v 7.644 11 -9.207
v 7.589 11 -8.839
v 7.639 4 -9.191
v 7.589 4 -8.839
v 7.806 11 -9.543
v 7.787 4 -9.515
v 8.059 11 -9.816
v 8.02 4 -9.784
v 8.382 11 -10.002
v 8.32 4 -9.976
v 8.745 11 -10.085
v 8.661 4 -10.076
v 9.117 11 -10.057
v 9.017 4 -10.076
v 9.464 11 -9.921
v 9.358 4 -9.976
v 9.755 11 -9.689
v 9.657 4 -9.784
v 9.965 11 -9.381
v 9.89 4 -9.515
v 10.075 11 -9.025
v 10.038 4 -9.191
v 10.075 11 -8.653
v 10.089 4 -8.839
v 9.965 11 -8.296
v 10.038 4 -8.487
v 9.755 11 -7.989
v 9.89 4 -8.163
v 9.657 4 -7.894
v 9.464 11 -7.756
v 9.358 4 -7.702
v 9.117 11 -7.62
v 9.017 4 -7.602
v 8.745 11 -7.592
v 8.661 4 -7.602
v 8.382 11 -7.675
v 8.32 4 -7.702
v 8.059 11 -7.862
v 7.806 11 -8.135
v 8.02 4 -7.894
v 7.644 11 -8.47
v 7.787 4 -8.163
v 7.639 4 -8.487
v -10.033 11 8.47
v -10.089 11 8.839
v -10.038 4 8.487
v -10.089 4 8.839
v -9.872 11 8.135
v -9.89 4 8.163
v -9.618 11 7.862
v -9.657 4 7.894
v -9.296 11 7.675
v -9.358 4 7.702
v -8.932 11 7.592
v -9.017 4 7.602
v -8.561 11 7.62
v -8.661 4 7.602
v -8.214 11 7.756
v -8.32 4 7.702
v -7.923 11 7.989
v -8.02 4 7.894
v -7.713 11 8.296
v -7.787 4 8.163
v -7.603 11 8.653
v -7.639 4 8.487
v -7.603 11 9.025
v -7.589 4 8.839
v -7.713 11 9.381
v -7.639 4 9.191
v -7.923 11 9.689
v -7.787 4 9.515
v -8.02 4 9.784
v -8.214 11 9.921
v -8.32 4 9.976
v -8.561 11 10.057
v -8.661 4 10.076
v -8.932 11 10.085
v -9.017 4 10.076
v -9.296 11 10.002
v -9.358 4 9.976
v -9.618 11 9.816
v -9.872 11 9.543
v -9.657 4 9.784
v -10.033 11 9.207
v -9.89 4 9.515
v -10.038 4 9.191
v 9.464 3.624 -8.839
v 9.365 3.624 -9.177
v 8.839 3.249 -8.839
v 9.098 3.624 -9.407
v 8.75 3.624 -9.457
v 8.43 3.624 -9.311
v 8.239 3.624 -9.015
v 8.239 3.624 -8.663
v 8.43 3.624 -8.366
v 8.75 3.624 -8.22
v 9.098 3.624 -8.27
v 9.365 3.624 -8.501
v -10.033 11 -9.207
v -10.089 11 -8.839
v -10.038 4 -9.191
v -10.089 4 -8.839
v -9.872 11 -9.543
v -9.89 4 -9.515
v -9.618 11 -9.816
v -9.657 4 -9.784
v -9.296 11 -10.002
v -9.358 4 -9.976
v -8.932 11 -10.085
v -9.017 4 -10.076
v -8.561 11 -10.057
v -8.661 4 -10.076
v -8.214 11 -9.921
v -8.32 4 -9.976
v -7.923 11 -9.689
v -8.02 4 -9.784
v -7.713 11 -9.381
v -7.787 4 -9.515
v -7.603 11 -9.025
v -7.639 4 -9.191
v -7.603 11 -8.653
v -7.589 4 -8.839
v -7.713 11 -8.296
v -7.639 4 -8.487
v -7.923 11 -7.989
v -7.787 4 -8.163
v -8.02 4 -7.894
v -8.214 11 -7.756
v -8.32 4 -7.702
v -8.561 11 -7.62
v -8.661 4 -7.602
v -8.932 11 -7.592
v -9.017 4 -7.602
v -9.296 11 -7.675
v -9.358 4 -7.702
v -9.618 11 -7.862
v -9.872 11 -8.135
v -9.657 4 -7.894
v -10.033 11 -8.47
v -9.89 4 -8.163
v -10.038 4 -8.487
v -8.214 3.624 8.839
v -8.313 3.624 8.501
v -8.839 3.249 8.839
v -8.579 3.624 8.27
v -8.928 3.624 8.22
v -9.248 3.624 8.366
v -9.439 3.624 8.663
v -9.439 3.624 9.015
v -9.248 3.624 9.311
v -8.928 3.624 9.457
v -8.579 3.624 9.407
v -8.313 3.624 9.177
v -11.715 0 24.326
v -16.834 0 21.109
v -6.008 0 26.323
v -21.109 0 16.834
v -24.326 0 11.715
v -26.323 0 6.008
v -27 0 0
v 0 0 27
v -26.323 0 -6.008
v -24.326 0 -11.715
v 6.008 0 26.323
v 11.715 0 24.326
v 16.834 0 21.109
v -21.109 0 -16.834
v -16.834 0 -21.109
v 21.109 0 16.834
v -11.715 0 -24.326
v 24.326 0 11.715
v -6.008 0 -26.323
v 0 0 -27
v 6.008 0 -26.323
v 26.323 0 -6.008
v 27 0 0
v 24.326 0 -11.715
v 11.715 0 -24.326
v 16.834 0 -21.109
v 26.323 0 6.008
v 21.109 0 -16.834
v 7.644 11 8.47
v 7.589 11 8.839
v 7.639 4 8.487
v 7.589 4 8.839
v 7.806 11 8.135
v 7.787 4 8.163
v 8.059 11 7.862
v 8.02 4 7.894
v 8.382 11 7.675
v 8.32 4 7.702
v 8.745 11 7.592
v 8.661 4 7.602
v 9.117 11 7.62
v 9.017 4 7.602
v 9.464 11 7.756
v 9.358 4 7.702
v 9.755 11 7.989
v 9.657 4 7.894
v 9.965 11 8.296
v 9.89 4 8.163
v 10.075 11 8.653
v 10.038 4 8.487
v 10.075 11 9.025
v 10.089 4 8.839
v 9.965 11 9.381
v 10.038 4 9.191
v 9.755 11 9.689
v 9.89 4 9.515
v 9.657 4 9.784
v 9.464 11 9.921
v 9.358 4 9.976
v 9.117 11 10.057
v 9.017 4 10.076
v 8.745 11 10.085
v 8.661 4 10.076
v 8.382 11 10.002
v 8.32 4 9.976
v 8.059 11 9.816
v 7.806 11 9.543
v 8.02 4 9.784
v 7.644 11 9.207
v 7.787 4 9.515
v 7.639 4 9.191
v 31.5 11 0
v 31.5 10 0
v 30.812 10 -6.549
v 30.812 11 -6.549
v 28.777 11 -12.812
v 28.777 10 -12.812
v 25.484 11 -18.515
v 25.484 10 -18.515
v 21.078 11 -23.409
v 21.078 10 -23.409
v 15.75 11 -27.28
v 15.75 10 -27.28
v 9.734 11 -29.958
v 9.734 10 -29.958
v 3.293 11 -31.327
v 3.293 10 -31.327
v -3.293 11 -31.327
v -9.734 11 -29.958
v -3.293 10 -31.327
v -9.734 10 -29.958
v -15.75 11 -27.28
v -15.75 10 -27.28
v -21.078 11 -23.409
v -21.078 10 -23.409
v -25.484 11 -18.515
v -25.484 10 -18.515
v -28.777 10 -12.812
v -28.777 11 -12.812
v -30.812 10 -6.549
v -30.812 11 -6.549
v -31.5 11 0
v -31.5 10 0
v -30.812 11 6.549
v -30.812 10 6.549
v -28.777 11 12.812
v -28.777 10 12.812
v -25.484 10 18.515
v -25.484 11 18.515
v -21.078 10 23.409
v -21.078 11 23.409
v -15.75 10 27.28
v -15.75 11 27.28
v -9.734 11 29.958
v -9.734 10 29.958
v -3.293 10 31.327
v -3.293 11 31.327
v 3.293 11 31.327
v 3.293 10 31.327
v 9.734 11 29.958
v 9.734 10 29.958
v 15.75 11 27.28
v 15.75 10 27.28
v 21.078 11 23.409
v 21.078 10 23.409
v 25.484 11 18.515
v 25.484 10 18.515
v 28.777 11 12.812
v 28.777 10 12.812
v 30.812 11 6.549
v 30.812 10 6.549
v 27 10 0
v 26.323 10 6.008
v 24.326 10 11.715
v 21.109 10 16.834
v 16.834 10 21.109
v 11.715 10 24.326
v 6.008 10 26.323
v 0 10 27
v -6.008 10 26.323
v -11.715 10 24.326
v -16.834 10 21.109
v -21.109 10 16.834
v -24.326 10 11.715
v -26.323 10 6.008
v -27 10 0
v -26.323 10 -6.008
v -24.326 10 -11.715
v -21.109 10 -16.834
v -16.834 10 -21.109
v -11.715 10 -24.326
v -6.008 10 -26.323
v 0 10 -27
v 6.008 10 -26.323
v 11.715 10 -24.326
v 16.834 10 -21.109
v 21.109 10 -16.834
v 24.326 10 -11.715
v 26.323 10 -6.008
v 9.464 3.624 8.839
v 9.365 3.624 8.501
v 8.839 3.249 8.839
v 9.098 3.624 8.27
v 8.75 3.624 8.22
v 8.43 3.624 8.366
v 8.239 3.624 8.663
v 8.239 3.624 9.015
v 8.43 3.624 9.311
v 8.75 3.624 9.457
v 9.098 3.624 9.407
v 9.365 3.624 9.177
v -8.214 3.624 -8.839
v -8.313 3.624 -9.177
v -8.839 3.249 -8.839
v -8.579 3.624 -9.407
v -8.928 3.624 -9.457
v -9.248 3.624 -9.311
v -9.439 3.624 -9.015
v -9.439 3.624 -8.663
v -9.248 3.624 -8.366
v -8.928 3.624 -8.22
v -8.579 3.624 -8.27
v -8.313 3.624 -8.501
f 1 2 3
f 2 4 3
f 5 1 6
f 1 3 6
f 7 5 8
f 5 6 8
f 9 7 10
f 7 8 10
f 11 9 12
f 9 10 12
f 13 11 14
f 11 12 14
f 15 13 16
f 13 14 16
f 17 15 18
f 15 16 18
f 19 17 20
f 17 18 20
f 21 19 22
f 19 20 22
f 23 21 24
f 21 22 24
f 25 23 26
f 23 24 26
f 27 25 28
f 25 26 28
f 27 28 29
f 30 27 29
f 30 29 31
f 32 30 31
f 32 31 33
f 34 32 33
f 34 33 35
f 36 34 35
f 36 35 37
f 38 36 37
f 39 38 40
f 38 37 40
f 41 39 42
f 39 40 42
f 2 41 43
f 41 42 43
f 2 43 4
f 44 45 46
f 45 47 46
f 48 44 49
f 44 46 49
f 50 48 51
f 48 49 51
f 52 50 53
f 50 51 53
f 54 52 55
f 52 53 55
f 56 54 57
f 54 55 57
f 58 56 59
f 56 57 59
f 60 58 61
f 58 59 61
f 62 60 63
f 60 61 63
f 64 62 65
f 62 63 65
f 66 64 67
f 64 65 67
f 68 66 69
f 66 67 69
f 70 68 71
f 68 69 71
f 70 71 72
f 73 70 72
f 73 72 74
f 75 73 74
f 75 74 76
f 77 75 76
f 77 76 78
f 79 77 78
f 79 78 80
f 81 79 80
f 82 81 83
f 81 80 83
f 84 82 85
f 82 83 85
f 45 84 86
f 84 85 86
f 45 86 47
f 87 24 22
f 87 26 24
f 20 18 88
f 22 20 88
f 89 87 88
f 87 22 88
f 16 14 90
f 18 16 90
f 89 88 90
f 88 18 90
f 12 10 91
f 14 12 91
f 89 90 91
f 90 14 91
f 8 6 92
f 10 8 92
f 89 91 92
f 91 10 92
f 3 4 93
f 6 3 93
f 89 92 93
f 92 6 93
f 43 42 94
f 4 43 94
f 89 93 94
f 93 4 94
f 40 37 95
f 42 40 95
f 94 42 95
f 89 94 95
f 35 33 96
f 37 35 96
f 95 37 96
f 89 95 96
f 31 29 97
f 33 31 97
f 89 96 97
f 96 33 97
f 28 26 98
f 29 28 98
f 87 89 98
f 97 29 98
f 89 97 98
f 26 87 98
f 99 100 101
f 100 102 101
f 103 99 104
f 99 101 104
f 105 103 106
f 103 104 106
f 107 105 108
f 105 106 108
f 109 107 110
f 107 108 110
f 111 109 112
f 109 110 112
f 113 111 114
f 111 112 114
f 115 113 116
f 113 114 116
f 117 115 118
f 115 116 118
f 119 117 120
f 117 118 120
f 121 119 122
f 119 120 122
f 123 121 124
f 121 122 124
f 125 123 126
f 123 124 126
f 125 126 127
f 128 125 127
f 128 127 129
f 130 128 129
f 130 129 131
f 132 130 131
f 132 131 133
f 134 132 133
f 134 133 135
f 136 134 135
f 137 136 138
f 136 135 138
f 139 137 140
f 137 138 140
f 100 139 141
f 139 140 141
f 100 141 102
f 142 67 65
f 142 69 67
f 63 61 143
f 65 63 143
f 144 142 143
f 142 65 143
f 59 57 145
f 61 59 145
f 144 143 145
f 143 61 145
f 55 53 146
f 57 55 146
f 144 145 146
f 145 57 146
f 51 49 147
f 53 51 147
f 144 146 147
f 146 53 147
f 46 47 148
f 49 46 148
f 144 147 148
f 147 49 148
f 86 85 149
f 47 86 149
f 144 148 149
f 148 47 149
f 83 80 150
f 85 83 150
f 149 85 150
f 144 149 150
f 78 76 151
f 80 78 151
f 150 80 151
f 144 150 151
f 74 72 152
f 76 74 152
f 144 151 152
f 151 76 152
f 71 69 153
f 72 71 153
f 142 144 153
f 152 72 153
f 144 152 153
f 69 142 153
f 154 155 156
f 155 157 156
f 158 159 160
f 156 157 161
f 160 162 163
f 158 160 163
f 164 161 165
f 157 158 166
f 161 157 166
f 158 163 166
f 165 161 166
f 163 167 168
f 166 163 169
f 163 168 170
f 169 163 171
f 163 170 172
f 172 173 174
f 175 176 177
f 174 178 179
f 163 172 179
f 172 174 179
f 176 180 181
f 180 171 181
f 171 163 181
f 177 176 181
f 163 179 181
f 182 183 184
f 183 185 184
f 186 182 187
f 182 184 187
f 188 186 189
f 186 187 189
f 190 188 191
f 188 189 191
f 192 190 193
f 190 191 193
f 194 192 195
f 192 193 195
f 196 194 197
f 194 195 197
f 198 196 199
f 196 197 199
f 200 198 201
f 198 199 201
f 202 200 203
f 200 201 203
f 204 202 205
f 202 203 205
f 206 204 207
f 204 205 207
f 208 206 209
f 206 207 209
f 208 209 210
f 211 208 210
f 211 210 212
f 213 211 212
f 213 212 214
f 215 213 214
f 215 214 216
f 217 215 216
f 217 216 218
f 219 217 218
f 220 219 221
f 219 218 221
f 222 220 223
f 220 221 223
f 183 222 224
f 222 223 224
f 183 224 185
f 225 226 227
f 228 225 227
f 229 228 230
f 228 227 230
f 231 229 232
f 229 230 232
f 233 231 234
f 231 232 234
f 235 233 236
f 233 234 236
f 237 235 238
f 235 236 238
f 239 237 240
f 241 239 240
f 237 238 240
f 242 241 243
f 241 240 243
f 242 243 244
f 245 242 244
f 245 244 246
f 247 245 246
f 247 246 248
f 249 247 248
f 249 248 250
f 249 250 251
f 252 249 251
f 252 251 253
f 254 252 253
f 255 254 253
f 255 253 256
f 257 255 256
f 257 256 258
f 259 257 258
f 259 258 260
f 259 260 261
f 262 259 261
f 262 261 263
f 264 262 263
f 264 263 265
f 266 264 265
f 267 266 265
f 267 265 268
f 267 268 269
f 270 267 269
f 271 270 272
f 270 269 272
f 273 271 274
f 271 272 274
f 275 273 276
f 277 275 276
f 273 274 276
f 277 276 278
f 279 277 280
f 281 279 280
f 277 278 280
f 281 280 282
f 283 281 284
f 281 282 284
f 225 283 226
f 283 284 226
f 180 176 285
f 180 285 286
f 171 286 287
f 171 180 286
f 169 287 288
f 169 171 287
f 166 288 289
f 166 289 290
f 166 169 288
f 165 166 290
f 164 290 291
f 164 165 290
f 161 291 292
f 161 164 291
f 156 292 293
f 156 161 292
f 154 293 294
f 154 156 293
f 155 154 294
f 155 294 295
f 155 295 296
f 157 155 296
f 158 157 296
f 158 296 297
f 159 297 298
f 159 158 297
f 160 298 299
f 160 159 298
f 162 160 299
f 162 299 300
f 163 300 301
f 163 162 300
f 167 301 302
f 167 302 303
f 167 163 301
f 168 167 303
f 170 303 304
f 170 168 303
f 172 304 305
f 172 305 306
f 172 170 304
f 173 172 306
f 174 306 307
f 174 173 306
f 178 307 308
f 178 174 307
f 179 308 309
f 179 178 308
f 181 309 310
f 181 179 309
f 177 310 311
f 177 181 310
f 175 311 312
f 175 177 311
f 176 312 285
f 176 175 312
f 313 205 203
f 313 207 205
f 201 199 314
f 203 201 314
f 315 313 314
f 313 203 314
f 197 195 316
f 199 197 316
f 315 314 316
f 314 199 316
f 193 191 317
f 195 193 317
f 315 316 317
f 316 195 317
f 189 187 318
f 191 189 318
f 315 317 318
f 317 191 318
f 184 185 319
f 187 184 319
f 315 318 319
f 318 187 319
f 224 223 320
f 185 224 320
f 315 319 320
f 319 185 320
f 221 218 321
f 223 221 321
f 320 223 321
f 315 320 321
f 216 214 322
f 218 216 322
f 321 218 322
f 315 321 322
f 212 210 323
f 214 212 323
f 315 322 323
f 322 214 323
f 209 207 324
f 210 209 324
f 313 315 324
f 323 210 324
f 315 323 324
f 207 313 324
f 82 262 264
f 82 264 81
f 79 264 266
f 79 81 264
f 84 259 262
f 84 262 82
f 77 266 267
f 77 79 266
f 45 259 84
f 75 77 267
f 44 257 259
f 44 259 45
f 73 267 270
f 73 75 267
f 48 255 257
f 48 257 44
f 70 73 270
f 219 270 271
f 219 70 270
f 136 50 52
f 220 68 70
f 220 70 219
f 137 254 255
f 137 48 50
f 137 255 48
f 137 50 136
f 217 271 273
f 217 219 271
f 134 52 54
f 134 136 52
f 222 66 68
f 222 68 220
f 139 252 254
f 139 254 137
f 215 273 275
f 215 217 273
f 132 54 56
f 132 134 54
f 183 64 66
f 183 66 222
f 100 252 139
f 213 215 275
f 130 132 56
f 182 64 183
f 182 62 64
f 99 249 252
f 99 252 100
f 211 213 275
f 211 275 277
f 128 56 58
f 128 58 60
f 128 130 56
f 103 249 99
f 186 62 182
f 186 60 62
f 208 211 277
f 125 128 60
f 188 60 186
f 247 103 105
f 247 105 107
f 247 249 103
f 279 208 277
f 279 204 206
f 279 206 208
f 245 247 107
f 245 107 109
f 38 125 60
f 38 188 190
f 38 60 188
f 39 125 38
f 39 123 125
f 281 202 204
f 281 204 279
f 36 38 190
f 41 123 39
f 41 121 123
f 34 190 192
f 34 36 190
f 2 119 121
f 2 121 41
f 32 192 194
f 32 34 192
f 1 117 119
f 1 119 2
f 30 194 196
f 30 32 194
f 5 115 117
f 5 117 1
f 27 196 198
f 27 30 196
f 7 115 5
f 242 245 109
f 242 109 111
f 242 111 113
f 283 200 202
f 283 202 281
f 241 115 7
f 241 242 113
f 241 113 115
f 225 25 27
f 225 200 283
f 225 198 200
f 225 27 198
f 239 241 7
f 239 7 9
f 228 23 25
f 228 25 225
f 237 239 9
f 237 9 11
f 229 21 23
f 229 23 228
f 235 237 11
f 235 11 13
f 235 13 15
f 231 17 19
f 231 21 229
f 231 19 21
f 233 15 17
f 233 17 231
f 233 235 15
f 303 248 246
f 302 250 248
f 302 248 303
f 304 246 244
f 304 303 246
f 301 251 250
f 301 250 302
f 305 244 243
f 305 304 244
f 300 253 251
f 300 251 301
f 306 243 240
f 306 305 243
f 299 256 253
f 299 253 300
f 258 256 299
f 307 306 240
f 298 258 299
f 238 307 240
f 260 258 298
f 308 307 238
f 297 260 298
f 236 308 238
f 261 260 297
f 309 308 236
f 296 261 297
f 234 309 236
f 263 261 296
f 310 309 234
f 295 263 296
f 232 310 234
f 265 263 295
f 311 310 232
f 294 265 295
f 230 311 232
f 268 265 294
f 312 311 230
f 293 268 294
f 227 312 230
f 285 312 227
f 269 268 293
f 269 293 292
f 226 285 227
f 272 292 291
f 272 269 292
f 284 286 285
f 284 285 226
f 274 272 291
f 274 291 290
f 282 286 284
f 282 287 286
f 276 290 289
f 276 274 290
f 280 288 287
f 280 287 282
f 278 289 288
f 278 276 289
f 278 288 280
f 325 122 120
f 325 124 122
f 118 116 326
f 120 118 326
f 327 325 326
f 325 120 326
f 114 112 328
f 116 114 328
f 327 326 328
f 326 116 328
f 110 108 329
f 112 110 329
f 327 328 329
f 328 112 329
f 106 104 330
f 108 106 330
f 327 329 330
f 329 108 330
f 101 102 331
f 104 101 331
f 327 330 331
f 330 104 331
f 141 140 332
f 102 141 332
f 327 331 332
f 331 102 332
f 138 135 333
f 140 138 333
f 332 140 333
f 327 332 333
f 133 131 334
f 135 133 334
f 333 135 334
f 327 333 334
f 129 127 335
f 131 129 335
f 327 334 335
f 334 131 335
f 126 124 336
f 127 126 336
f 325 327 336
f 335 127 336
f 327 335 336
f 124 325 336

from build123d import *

# Parameters (mm, degrees)
SKETCH1_R                       = 31.5
BOSS_EXTRUDE1_DEPTH             = 11
TAP_DRILL_FOR_M3X0_5_TAP1_D     = 2.5
TAP_DRILL_FOR_M3X0_5_TAP1_DEPTH = 7
TAP_DRILL_FOR_M3X0_5_TAP1_TIP   = 0.751075774
SKETCH9_OUTSIDE_W               = 82.954
SKETCH9_OUTSIDE_H               = 82.954
SKETCH9_OUTSIDE_R               = 27
CUT_EXTRUDE1_DEPTH              = 10


with BuildPart() as part:
    # Sketch1 → Boss-Extrude1 (new body)
    with BuildSketch(Plane(origin=(0, 0, 0), x_dir=(1, 0, 0), z_dir=(0, 1, 0))):
        Circle(SKETCH1_R)
    extrude(amount=BOSS_EXTRUDE1_DEPTH)

    # Tap Drill for M3x0.5 Tap1
    with Locations(Plane(origin=(0, 11, 0), x_dir=(1, 0, 0), z_dir=(0, 1, 0))):
        with Locations((-8.838834765, 8.838834765), (8.838834765, 8.838834765), (8.838834765, -8.838834765), (-8.838834765, -8.838834765)):
            Hole(TAP_DRILL_FOR_M3X0_5_TAP1_D / 2, depth=TAP_DRILL_FOR_M3X0_5_TAP1_DEPTH)
            with Locations((0, 0, -(TAP_DRILL_FOR_M3X0_5_TAP1_DEPTH + TAP_DRILL_FOR_M3X0_5_TAP1_TIP / 2))):  # 118° drill point
                Cone(0, TAP_DRILL_FOR_M3X0_5_TAP1_D / 2, TAP_DRILL_FOR_M3X0_5_TAP1_TIP, mode=Mode.SUBTRACT)

    # Sketch9 outside → Cut-Extrude1 (cut)
    with BuildSketch(Plane.XZ):
        Rectangle(SKETCH9_OUTSIDE_W, SKETCH9_OUTSIDE_H)
        Circle(SKETCH9_OUTSIDE_R, mode=Mode.SUBTRACT)
    extrude(amount=-CUT_EXTRUDE1_DEPTH, mode=Mode.SUBTRACT)


solid = part.part
